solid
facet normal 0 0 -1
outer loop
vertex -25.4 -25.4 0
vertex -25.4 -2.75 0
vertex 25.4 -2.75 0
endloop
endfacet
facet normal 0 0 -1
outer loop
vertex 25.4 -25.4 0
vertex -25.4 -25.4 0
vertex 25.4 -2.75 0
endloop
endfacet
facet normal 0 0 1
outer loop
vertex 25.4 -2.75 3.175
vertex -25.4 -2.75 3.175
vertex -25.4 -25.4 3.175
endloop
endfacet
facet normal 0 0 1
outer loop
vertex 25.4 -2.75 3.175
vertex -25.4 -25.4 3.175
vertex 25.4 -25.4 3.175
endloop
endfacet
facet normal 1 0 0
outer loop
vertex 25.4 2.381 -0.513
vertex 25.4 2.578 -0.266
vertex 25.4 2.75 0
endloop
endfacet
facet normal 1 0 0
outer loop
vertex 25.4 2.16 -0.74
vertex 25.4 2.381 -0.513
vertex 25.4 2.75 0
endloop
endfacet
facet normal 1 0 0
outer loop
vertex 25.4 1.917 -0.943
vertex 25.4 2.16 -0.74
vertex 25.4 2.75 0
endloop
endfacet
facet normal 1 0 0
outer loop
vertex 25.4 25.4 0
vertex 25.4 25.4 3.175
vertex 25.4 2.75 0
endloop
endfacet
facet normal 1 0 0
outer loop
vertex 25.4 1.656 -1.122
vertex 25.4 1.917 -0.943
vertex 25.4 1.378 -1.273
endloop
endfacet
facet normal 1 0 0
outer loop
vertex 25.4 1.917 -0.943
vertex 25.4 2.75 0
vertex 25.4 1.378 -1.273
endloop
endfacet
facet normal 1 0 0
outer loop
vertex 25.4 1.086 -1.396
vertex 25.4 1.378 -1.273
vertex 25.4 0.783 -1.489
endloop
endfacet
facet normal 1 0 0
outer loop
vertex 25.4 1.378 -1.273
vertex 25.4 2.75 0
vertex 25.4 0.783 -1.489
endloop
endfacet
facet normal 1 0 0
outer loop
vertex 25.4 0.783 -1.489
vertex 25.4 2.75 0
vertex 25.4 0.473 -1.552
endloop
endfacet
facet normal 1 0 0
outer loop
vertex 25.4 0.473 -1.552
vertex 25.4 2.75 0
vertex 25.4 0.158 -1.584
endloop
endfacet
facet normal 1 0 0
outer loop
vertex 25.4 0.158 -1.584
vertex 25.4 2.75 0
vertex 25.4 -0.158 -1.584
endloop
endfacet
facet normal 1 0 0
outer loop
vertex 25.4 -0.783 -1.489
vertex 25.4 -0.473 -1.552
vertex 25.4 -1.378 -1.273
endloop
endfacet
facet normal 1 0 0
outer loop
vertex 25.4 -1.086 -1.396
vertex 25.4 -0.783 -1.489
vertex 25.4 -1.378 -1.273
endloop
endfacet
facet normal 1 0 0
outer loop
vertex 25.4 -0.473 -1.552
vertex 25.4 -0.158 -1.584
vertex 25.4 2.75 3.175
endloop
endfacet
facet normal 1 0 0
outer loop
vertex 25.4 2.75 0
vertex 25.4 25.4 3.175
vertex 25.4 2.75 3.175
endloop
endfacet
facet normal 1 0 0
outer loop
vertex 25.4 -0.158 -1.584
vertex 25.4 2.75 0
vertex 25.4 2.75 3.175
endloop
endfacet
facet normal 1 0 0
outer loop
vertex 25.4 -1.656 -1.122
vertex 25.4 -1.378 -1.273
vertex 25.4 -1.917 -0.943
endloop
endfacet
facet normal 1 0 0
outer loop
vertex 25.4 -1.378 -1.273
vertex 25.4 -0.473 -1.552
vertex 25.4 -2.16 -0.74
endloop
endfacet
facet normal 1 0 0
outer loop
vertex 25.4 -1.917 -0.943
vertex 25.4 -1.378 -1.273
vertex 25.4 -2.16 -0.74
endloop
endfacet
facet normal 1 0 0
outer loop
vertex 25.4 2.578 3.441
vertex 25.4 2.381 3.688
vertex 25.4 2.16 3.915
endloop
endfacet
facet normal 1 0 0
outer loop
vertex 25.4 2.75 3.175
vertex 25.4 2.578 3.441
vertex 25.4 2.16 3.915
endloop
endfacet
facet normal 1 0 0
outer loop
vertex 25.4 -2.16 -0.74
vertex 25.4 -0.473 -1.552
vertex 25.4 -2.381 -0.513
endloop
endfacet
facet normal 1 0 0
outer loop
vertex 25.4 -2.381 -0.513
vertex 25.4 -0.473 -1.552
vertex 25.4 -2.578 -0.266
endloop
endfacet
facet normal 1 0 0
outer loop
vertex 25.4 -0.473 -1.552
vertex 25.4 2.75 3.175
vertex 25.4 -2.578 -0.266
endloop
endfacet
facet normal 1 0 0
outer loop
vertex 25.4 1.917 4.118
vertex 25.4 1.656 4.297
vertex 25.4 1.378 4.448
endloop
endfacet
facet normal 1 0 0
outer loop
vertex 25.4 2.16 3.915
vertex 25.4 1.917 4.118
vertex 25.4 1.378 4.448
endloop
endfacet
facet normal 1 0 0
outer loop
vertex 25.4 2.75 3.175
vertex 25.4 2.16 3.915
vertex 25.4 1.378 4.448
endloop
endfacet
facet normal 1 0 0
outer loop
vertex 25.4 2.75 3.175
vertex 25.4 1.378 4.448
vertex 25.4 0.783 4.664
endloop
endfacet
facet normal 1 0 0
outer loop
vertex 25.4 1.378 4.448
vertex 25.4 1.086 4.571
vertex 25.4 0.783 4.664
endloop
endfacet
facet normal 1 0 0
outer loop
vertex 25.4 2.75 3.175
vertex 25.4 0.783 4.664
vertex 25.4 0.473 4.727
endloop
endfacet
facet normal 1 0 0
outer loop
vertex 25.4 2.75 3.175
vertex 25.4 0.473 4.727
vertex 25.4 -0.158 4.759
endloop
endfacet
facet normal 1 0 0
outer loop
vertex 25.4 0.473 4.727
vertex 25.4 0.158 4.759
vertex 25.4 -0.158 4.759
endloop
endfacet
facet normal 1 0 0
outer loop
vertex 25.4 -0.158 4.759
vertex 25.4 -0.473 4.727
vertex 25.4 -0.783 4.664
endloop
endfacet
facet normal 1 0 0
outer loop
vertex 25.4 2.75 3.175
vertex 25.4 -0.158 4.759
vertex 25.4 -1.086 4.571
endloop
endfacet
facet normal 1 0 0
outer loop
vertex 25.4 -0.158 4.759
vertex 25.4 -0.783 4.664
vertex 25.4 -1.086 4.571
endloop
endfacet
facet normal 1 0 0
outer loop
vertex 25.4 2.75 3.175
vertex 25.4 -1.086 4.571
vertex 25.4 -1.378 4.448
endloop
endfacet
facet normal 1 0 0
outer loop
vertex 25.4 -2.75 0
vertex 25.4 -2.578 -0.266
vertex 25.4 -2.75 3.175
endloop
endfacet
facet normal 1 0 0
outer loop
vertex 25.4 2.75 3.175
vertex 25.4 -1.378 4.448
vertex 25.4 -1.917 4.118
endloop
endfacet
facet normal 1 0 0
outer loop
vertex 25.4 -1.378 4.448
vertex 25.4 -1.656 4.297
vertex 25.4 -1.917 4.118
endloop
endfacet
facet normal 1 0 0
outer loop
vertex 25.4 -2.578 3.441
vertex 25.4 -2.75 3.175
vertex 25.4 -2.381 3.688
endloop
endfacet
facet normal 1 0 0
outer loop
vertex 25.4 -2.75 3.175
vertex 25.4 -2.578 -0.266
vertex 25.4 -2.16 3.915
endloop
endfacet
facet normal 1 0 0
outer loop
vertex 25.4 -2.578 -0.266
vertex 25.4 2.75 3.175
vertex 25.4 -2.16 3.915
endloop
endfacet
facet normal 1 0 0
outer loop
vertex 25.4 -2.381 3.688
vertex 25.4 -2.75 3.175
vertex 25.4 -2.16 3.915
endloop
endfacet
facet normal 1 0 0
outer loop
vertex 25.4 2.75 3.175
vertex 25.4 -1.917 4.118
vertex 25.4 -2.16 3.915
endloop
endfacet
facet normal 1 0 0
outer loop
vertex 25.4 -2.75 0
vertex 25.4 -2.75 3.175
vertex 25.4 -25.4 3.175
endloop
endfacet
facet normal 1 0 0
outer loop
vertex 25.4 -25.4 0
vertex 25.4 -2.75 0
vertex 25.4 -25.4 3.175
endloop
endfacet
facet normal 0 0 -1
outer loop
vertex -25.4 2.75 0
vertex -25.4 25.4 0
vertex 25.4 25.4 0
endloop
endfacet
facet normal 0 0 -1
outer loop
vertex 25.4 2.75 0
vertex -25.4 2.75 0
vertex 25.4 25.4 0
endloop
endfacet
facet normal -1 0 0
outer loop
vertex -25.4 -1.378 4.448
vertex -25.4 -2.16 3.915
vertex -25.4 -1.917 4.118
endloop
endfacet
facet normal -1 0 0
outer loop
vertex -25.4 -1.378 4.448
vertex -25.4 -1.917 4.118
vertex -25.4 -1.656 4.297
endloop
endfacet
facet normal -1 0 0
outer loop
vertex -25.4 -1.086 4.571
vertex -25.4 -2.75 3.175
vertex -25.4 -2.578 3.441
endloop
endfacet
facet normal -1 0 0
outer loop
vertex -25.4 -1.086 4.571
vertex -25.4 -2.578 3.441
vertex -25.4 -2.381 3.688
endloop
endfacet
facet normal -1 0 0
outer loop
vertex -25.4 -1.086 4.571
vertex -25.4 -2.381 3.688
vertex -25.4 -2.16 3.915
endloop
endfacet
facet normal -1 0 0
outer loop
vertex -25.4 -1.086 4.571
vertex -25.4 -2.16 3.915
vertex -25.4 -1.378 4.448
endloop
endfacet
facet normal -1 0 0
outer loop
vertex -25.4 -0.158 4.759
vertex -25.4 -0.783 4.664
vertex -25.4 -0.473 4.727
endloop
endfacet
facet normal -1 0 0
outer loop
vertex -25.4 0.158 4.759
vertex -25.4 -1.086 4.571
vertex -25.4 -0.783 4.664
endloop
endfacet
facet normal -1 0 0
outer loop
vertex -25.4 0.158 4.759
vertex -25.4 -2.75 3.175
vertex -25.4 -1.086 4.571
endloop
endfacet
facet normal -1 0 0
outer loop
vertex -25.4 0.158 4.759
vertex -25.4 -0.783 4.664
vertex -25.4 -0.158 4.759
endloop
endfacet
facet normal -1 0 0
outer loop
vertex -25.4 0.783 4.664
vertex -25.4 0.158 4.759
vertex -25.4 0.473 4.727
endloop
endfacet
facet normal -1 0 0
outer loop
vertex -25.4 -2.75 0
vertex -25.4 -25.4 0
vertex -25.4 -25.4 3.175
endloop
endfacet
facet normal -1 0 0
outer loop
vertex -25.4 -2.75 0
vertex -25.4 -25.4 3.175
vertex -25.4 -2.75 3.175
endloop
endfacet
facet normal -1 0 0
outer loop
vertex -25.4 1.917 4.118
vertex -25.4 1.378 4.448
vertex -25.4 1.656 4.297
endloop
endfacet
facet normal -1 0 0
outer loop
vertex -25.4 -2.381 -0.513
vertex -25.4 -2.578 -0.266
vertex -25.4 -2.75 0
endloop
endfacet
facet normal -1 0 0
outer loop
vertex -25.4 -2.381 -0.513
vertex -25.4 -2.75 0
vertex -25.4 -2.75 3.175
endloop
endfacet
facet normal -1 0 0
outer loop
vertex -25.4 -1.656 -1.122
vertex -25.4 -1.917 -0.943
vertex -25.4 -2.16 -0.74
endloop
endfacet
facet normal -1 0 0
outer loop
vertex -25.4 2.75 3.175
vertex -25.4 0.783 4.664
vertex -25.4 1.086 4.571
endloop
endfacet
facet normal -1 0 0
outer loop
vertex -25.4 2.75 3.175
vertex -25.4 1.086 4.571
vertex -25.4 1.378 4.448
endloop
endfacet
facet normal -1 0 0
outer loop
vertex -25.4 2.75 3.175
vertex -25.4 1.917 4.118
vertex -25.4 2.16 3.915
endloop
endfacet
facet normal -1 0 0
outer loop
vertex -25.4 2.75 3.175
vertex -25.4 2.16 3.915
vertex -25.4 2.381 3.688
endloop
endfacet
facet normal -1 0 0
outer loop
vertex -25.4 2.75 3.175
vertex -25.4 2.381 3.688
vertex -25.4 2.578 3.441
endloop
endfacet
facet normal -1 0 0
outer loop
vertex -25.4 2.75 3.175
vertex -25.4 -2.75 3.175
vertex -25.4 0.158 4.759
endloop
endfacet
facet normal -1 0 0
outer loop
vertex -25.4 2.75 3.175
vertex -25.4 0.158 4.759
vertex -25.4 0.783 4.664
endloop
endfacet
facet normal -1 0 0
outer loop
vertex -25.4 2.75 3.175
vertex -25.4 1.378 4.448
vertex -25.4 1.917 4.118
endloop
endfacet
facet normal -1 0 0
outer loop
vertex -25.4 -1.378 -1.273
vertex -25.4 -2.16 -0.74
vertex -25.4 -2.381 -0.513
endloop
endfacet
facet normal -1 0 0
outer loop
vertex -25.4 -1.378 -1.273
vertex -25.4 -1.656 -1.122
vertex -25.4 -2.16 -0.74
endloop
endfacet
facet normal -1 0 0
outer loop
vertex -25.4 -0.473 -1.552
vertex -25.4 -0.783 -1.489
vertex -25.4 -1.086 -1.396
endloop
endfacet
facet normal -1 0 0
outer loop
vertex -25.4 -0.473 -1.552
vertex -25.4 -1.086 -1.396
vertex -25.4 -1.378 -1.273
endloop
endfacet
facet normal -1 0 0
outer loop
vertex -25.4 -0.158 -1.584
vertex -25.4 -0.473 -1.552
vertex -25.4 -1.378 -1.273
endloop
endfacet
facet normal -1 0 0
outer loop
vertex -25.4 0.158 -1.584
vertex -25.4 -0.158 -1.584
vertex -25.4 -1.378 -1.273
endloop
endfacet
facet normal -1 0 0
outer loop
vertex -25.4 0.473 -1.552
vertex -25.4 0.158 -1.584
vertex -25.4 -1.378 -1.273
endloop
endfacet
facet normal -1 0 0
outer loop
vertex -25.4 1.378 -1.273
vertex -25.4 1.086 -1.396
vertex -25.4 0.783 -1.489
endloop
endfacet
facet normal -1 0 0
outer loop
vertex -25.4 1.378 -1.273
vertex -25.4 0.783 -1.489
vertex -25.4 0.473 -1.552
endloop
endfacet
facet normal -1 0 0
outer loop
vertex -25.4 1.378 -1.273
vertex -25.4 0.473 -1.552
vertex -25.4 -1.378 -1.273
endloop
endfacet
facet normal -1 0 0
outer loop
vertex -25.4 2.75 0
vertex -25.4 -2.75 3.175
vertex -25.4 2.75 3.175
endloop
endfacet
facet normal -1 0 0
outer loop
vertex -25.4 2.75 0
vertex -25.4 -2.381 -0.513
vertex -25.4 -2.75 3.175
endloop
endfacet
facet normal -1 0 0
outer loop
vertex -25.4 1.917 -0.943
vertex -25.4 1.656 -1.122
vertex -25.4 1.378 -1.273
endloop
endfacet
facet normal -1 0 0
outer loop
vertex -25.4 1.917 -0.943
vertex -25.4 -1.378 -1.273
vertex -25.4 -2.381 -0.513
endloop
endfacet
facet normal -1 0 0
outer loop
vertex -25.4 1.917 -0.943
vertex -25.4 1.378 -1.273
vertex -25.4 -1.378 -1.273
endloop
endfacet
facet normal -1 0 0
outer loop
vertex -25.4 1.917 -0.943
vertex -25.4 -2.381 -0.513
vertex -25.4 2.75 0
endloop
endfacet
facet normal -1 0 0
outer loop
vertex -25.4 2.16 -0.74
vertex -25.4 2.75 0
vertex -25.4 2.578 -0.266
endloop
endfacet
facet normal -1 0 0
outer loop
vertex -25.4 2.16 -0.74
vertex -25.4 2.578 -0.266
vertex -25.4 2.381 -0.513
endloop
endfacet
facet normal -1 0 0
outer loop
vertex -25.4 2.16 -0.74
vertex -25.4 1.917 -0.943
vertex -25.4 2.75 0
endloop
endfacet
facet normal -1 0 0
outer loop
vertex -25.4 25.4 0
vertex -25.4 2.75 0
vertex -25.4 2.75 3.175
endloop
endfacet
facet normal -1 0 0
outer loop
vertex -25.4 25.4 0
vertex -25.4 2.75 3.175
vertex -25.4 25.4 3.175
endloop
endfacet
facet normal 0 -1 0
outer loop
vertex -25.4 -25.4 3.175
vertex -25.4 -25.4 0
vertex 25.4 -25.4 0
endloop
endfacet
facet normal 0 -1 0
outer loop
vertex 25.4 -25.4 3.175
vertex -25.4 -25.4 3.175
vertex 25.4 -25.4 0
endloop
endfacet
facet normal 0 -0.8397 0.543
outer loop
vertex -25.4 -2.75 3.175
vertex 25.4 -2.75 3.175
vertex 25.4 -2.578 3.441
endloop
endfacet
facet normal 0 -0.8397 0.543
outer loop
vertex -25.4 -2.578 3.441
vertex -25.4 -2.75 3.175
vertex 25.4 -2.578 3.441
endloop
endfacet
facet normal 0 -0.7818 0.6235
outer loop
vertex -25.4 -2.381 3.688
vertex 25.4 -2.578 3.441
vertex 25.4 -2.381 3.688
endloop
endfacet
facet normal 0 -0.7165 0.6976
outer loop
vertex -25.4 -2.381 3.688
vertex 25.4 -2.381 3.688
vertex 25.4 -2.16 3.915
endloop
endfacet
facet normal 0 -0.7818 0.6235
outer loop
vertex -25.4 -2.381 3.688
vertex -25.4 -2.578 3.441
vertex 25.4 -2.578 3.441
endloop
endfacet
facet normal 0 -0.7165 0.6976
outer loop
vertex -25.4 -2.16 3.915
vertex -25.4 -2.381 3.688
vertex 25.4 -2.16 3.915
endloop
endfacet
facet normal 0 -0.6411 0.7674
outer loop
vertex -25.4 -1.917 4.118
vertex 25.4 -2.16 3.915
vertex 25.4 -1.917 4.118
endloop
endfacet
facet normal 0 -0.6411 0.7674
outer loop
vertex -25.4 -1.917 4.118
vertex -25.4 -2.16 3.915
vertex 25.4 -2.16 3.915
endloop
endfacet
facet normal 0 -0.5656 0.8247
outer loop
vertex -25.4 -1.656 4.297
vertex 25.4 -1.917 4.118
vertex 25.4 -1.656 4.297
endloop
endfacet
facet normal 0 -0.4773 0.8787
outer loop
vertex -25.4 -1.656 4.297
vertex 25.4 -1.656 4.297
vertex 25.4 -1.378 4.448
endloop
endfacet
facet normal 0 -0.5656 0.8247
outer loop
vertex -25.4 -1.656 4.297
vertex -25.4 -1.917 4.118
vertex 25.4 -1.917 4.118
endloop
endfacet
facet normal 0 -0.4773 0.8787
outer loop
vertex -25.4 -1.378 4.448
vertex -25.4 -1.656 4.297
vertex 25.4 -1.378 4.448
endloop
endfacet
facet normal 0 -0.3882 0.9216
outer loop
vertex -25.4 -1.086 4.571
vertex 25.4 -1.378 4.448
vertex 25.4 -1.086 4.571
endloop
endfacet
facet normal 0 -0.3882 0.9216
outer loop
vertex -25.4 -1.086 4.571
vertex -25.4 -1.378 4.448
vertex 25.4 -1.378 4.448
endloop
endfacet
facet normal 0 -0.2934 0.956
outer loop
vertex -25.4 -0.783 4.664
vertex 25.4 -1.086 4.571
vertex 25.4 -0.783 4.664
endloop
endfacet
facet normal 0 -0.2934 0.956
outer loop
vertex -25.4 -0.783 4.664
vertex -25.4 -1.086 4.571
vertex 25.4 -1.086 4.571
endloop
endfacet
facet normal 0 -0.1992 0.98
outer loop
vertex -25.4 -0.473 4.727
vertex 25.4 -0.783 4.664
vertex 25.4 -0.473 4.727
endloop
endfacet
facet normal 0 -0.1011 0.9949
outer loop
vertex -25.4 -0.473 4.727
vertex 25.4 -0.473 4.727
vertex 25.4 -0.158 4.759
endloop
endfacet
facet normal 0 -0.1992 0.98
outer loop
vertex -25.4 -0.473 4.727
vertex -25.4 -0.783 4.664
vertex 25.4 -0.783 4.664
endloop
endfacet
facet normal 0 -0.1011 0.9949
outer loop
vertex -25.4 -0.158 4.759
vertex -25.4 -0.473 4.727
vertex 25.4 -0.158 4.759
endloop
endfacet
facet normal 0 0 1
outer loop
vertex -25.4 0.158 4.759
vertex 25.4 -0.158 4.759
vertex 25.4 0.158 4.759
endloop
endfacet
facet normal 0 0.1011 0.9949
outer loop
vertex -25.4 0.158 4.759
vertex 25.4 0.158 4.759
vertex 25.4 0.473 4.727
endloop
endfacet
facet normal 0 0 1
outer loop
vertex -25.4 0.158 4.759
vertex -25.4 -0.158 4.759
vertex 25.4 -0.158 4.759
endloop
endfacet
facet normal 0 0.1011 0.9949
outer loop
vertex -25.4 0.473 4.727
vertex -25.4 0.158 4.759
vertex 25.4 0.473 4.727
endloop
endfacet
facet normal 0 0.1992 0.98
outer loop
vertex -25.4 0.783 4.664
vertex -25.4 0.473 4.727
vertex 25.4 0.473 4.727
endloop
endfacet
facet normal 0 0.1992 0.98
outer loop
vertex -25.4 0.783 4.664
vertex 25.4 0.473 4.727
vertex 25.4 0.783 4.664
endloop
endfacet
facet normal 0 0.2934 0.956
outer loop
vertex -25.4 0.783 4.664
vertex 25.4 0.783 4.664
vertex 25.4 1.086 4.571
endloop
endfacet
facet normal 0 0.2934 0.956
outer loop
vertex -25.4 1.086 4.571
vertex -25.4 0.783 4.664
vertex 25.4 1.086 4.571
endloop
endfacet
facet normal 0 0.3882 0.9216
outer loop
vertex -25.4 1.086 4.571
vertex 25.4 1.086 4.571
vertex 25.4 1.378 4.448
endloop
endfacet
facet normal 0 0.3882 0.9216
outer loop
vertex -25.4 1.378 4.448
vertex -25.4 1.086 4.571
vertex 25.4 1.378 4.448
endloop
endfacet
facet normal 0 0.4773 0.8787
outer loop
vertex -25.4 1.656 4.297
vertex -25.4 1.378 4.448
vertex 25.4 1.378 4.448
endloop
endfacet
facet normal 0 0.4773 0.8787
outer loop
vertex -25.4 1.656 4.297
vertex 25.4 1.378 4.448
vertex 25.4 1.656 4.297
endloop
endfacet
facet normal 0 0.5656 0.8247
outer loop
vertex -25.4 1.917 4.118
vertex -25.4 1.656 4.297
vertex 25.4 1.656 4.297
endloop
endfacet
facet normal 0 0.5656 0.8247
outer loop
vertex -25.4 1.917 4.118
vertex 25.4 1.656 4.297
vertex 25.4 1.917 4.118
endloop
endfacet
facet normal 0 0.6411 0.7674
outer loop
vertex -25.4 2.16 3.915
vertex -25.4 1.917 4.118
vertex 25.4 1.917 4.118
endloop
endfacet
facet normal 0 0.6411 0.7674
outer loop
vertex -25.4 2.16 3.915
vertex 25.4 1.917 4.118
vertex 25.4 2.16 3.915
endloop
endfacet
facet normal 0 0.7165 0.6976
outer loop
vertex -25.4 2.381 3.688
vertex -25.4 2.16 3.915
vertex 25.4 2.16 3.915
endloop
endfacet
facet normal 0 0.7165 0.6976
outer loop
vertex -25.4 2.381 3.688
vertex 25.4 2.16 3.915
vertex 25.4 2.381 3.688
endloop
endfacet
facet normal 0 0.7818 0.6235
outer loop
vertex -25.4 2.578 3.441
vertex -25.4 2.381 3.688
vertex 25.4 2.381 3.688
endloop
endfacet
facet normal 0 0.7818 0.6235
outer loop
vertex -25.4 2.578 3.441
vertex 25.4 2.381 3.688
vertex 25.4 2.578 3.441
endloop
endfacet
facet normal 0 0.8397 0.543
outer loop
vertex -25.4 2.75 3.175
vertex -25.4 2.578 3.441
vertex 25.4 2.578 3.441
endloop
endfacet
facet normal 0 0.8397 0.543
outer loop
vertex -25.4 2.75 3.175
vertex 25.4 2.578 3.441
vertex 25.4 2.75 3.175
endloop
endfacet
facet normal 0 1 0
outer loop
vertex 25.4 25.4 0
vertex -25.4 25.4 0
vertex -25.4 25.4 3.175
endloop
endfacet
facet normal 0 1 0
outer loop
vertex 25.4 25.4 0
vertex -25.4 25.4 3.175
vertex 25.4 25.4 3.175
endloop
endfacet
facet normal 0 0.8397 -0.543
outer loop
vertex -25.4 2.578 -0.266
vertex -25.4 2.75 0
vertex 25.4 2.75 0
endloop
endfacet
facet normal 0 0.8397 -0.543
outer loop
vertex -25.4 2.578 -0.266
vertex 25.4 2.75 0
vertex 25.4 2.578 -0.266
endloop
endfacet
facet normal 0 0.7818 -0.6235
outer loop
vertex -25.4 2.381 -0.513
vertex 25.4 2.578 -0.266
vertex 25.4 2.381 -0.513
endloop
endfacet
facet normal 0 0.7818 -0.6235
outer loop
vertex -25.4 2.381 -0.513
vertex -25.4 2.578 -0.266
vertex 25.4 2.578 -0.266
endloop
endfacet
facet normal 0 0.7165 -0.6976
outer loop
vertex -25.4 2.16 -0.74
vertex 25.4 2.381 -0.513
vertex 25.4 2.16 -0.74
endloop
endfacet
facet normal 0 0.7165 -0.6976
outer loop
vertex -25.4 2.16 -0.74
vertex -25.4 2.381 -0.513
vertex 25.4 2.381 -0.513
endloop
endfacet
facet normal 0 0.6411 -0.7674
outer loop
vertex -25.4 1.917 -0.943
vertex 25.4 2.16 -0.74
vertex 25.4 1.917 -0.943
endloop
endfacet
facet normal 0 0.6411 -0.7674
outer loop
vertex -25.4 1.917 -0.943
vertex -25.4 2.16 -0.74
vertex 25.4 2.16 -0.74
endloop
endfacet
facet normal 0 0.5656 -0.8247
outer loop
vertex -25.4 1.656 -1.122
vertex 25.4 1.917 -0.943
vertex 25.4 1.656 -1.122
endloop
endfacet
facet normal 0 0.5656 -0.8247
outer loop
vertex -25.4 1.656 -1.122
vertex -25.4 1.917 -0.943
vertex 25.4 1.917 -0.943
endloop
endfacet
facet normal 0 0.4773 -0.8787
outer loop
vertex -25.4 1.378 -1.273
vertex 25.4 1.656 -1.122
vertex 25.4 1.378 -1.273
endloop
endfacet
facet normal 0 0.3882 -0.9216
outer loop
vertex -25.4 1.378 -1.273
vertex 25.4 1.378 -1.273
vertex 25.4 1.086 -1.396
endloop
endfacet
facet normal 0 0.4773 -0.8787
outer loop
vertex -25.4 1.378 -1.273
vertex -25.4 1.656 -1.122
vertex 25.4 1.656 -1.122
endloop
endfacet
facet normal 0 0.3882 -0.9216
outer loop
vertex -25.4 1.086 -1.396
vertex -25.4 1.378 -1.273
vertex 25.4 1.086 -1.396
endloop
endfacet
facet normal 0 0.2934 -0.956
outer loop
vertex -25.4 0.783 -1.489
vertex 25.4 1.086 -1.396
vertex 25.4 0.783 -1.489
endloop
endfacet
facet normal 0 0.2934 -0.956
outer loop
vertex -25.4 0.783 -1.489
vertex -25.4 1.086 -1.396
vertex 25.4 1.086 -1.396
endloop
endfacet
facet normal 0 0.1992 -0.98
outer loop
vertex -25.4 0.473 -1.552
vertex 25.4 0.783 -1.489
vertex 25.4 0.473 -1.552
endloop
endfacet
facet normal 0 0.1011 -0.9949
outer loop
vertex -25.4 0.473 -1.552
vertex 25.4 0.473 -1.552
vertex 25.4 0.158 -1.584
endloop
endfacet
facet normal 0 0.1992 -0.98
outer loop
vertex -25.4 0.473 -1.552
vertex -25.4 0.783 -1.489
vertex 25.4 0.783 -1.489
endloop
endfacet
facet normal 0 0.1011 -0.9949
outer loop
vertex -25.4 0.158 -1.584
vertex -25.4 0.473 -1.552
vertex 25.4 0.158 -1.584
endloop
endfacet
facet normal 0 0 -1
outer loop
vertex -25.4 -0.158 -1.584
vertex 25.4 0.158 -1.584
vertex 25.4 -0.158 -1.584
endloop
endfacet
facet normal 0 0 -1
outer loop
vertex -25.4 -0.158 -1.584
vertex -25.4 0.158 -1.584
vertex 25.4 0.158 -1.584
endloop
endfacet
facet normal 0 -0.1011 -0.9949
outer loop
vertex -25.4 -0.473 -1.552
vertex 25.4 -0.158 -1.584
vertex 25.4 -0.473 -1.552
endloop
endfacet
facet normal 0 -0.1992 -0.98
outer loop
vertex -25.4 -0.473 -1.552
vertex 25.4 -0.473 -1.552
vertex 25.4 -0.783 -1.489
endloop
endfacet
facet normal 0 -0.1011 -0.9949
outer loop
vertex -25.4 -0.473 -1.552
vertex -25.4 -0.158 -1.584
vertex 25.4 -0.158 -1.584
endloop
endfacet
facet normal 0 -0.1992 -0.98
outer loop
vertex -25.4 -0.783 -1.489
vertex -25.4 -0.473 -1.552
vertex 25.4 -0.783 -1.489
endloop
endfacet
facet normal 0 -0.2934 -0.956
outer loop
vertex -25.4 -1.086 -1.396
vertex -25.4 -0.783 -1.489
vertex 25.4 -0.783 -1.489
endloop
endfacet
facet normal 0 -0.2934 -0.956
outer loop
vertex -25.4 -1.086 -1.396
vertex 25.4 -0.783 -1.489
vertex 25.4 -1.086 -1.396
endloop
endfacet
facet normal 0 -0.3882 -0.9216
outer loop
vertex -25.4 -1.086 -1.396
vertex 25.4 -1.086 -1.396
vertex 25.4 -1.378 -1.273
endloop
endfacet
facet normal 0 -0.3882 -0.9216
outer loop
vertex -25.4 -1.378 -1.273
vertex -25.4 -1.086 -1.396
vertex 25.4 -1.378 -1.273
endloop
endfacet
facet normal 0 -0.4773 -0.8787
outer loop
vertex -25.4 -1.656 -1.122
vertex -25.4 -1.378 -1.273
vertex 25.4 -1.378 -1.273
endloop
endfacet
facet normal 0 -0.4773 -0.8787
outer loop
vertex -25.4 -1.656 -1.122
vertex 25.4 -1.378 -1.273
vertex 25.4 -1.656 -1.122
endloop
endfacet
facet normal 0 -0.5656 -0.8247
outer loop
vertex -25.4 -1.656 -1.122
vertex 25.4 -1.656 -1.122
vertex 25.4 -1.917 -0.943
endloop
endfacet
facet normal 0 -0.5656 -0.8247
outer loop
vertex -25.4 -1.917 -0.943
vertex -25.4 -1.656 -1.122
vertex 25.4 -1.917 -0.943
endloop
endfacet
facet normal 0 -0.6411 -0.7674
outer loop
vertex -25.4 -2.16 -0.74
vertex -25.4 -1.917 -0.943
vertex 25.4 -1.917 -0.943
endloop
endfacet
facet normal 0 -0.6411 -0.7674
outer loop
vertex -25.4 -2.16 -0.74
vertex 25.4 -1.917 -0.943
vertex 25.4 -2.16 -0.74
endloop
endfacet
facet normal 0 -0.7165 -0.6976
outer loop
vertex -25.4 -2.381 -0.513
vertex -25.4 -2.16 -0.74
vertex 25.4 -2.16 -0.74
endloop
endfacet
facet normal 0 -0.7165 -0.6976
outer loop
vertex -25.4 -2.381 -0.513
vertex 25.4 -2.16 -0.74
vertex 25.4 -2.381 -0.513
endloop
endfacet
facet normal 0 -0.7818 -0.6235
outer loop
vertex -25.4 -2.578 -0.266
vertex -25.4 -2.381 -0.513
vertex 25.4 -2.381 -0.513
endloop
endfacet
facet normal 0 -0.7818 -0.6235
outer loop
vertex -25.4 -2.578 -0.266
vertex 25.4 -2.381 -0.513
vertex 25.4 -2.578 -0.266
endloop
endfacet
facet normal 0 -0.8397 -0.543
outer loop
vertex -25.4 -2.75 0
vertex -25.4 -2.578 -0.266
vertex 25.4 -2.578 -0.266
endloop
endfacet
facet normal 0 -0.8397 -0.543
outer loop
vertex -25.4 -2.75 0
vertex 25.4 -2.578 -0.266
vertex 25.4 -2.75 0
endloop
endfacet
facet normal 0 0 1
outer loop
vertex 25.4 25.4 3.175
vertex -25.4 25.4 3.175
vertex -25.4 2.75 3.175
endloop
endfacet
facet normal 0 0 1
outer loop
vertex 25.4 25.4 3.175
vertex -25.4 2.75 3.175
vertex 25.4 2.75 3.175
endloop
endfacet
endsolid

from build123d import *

# Parameters (mm, degrees)
F0_W     = 50.8
F0_H     = 50.8
F1_DEPTH = 3.175
F2_R     = 3.175
F3_DEPTH = 50.8


with BuildPart() as f1:
    # F0 (on Top) → F1 (new body)
    with BuildSketch(Plane.XY):
        Rectangle(F0_W, F0_H)
    extrude(amount=F1_DEPTH)

    # F2 (on face) → F3 (join, through all)
    with BuildSketch(Plane(origin=(-25.4, 0, 0), x_dir=(0, -1, 0), z_dir=(-1, 0, 0))):
        with Locations((0, 1.5875)):
            Circle(F2_R)
    extrude(amount=-F3_DEPTH)


solid = f1.part
